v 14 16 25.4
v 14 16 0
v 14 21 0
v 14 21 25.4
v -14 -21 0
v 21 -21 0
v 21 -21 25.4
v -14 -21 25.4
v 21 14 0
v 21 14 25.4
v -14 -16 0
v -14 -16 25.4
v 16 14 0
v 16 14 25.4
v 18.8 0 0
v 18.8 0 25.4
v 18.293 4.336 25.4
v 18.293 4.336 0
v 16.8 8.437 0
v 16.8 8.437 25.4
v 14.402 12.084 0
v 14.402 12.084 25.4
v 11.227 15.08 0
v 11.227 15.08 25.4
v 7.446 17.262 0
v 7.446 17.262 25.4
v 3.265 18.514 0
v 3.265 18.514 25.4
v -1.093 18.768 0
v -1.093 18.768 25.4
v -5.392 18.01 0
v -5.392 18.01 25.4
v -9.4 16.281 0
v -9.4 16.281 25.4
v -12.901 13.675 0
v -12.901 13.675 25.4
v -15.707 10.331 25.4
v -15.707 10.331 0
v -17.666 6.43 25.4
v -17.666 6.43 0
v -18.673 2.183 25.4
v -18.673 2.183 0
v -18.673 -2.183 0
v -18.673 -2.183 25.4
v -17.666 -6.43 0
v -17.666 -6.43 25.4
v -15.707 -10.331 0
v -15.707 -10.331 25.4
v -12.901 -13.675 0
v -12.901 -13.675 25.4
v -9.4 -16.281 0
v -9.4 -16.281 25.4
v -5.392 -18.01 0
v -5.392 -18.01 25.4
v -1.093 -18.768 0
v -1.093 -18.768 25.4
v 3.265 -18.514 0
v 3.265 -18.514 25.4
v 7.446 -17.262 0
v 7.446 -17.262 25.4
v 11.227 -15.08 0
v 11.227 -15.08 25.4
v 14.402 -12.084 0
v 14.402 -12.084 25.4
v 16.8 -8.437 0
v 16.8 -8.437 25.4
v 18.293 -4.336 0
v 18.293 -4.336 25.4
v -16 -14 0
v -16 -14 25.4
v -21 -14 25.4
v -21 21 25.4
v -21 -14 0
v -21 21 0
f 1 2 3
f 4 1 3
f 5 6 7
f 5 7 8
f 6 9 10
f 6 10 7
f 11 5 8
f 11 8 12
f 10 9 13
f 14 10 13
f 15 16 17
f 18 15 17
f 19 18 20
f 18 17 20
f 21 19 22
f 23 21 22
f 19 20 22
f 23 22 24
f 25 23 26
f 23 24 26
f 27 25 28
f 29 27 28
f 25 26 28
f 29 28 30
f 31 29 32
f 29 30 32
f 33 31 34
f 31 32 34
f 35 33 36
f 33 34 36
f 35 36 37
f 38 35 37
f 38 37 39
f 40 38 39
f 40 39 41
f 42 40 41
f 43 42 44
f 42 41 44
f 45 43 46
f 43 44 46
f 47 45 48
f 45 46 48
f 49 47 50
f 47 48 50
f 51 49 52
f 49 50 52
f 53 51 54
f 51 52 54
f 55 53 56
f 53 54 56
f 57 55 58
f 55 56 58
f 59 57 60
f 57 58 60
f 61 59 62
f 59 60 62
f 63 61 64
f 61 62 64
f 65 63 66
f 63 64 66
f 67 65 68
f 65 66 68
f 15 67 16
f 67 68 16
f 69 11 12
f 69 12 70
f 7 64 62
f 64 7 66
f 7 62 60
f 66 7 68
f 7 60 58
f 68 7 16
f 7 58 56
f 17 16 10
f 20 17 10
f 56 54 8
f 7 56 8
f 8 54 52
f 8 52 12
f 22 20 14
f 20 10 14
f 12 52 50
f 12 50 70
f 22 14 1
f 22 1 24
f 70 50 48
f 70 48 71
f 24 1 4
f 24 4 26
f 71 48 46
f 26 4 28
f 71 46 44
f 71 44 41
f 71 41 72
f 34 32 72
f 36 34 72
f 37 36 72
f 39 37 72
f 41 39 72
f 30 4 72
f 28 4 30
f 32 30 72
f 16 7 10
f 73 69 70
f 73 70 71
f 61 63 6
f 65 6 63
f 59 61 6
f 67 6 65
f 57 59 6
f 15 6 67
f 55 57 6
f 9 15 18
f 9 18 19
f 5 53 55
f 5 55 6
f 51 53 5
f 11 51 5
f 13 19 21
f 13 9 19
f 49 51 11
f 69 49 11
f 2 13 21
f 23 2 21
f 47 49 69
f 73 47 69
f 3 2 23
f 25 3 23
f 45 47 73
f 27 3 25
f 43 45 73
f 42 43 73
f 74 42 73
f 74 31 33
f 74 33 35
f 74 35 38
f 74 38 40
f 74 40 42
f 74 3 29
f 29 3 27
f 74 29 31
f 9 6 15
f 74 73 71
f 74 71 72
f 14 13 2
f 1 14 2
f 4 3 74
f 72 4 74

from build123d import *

# Parameters (mm, degrees)
BOSS_EXTRUDE1_DEPTH = 25.4
CUT_EXTRUDE1_DEPTH  = 25.4
CUT_EXTRUDE2_DEPTH  = 25.4
SKETCH4_R           = 18.8
CUT_EXTRUDE3_DEPTH  = 25.4


with BuildPart() as part:
    # Sketch1 → Boss-Extrude1 (new body)
    with BuildSketch(Plane.XY):
        Polygon((0, 21), (21, 21), (21, -21), (-21, -21), (-21, 21), align=None)
    extrude(amount=BOSS_EXTRUDE1_DEPTH)

    # Sketch2 → Cut-Extrude1 (cut)
    with BuildSketch(Plane.XY.offset(25.4)):
        Polygon((21, 21), (21, 14), (16, 14), (14, 16), (14, 21), align=None)
    extrude(amount=-CUT_EXTRUDE1_DEPTH, mode=Mode.SUBTRACT)

    # Sketch3 → Cut-Extrude2 (cut)
    with BuildSketch(Plane.XY.offset(25.4)):
        Polygon((-14, -16), (-16, -14), (-21, -14), (-21, -21), (-14, -21), align=None)
    extrude(amount=-CUT_EXTRUDE2_DEPTH, mode=Mode.SUBTRACT)

    # Sketch4 → Cut-Extrude3 (cut)
    with BuildSketch(Plane.XY.offset(25.4)):
        Circle(SKETCH4_R)
    extrude(amount=-CUT_EXTRUDE3_DEPTH, mode=Mode.SUBTRACT)


solid = part.part
